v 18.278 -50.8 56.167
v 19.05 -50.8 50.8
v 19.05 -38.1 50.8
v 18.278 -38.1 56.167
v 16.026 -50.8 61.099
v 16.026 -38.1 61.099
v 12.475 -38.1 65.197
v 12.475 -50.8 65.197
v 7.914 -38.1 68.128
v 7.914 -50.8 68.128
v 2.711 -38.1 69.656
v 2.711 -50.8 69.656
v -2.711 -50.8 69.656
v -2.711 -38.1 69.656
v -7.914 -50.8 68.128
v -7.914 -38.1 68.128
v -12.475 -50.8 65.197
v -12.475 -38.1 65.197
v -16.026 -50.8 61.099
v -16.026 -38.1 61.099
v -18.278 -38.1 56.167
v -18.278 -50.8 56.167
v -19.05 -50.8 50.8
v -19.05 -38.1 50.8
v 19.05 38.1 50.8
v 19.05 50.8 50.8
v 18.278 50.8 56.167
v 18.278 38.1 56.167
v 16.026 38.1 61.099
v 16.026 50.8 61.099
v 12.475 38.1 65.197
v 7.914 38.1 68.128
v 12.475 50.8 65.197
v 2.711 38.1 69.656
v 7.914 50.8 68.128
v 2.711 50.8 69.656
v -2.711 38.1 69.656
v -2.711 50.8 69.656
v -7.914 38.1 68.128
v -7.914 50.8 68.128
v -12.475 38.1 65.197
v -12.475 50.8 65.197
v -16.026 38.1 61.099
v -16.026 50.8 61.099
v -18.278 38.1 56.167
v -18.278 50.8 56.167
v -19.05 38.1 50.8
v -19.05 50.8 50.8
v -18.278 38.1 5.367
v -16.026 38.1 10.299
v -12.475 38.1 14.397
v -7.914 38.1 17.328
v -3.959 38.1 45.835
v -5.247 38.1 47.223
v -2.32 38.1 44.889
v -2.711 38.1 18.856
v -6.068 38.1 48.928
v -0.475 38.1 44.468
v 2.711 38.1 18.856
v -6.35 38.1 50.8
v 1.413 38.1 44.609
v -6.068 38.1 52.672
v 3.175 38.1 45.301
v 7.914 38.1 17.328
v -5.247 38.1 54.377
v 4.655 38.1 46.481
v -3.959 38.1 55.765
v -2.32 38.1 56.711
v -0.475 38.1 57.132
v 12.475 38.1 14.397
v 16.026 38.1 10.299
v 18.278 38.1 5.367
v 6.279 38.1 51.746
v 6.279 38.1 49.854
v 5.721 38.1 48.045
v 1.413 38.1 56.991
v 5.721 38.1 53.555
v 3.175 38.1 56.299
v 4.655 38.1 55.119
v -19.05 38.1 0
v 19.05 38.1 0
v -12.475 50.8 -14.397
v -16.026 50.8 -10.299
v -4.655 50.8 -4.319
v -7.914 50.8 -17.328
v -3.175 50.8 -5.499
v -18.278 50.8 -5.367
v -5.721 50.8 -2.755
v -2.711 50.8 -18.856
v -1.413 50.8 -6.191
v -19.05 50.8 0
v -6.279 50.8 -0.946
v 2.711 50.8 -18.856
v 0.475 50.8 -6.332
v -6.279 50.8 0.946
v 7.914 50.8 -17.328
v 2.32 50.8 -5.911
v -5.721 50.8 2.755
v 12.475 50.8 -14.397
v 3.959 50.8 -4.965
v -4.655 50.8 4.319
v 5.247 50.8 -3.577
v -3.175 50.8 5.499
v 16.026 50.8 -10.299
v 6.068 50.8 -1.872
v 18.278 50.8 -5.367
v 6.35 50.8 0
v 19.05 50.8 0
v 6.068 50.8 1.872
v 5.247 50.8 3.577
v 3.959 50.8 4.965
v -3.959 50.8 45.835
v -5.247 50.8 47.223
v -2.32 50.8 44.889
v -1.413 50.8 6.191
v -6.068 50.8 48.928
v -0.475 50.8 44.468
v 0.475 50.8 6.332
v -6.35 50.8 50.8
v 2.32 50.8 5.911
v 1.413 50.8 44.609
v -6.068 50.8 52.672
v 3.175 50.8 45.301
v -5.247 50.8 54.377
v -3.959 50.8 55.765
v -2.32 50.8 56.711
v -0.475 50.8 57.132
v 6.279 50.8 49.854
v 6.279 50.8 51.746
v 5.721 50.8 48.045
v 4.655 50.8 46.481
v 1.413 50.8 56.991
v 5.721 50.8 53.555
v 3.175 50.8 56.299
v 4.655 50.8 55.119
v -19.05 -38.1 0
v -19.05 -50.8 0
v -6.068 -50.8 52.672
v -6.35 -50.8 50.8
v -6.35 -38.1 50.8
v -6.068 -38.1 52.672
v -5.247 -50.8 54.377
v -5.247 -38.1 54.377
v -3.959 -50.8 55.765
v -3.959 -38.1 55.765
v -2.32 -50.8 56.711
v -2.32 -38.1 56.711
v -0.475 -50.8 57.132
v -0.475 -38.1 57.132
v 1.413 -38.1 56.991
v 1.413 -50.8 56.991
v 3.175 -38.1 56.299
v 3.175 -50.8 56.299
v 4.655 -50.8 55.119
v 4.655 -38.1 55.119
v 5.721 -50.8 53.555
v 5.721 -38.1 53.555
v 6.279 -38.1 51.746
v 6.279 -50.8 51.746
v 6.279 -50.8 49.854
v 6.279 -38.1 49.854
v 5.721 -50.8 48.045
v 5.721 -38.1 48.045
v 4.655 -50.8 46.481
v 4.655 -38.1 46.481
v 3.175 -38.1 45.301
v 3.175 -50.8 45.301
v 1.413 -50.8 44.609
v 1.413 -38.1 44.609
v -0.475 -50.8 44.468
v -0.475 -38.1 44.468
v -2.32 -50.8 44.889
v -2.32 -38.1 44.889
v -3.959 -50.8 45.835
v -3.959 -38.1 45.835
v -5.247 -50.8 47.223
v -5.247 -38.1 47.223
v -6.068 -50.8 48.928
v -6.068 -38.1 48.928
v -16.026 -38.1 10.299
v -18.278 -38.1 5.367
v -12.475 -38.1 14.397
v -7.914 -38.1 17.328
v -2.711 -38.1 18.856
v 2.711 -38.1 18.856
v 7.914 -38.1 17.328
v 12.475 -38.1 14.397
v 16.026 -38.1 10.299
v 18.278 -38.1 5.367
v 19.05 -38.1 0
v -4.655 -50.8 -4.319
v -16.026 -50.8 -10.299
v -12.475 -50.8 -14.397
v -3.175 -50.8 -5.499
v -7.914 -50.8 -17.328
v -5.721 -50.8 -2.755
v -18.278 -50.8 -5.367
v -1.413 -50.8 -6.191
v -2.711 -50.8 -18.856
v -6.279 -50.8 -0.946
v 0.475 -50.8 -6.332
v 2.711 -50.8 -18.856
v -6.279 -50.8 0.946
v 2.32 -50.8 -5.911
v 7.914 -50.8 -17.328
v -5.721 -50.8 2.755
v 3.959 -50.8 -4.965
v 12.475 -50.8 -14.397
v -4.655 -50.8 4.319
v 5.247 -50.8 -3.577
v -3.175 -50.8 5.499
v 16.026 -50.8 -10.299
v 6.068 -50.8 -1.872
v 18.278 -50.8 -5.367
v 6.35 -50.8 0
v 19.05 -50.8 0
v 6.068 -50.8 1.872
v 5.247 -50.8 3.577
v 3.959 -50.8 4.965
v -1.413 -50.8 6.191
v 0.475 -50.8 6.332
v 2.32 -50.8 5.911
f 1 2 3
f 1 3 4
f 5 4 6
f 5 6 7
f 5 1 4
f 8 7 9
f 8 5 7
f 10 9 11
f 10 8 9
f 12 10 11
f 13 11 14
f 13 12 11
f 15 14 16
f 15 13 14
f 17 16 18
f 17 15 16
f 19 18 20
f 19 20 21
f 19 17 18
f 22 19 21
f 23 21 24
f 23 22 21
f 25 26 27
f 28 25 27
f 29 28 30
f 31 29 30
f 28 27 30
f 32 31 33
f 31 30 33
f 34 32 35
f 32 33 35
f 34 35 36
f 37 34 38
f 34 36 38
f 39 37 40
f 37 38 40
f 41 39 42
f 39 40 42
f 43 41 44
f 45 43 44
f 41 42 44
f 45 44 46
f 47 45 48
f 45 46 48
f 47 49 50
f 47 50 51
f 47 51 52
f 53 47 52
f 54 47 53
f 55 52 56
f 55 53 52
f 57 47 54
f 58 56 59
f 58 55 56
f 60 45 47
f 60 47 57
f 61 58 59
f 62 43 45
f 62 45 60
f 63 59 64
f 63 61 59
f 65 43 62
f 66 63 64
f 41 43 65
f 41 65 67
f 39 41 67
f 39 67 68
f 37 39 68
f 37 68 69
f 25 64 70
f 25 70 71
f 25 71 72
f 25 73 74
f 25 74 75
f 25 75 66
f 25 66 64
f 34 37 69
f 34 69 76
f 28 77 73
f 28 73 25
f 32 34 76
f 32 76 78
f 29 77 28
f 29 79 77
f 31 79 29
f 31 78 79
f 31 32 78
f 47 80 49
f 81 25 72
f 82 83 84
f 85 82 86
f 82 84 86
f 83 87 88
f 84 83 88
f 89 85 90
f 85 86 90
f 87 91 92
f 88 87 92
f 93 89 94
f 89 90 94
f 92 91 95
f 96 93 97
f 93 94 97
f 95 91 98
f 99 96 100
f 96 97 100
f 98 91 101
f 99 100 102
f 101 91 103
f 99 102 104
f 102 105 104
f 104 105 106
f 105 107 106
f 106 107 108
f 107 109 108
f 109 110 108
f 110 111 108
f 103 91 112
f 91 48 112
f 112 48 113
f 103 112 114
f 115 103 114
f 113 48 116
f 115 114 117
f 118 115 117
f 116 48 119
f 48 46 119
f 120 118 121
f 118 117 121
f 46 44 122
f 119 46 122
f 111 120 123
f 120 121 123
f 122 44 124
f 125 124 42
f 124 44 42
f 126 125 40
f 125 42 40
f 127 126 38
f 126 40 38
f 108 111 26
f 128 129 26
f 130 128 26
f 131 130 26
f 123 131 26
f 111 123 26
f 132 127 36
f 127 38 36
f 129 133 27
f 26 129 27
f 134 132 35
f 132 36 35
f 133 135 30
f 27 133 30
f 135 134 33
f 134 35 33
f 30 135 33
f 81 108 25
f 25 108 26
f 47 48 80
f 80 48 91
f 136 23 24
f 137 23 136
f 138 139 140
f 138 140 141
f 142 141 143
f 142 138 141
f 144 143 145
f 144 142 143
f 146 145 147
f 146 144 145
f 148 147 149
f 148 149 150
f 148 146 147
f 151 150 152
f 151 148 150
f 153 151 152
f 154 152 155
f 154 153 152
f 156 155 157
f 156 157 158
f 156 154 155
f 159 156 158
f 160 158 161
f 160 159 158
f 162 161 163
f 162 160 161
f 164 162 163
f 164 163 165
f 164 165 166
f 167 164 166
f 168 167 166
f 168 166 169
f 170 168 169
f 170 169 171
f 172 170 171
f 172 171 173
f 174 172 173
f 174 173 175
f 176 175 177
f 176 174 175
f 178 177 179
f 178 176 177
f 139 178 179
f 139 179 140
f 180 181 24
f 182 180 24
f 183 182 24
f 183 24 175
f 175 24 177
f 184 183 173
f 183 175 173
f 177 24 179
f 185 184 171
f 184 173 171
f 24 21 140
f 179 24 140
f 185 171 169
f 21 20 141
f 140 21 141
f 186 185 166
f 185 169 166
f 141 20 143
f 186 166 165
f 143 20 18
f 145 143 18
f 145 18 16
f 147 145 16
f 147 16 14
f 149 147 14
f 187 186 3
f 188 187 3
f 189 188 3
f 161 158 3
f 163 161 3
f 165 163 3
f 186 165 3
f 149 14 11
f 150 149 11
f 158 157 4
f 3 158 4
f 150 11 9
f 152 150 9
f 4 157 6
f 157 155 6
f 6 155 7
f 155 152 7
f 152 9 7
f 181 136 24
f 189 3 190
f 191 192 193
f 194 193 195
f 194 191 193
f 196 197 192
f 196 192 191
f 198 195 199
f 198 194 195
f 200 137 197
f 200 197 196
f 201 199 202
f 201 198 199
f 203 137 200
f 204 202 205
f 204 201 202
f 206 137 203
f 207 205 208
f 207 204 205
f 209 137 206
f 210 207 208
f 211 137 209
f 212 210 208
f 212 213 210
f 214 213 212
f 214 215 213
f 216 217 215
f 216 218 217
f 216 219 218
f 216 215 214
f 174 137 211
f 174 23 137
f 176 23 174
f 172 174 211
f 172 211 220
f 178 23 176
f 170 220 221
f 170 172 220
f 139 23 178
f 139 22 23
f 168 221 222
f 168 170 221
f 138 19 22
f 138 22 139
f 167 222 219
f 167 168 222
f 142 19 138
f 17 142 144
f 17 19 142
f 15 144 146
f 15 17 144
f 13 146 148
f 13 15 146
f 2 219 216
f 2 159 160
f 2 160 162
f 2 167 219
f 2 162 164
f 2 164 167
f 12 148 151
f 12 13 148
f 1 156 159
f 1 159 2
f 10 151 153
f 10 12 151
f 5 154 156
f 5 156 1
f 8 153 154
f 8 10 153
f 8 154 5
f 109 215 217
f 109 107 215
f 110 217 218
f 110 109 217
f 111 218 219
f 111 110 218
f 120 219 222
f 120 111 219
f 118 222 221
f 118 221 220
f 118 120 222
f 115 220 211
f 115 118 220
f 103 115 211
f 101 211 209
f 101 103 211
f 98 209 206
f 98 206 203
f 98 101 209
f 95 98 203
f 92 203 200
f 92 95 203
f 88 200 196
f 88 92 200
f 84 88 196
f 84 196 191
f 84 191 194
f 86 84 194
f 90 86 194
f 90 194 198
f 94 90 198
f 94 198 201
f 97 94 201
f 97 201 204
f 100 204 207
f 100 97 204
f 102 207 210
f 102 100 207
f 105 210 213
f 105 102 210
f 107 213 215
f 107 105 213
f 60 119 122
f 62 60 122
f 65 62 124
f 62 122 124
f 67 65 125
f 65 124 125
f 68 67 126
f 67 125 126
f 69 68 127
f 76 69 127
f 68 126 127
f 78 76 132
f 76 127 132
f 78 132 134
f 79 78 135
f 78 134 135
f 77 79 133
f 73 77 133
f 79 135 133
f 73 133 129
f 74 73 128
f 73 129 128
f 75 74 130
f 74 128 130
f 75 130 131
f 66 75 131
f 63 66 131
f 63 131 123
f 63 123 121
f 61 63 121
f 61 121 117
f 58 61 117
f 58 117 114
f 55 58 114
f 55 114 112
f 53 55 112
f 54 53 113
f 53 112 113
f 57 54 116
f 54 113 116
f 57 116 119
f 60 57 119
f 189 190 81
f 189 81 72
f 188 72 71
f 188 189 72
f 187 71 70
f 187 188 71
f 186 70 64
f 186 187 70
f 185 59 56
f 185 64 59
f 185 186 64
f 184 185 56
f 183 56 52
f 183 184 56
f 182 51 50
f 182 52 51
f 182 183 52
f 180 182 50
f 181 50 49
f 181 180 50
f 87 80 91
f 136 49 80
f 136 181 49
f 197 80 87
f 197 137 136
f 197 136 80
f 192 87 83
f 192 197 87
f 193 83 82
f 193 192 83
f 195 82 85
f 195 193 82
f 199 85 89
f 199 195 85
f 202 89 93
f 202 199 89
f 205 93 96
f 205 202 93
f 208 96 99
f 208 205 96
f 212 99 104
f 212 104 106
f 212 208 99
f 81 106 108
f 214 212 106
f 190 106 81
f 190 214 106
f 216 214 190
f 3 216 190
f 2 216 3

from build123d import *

# Parameters (mm, degrees)
F0_R     = 19.05
F0_R_2   = 6.35
F1_DEPTH = 50.8
F3_DEPTH = 12.7


with BuildPart() as f1:
    # F0 (on Front) → F1 (new body, symmetric)
    with BuildSketch(Plane.XZ):
        Circle(F0_R)
        Circle(F0_R_2, mode=Mode.SUBTRACT)
    extrude(amount=F1_DEPTH, both=True)

    # F2 (on face) → F3 (join)
    with BuildSketch(Plane.XZ.offset(50.8)):
        with BuildLine():
            Line((-19.05, 50.8), (-19.05, 0))
            ThreePointArc((-19.05, 0), (0, 19.05), (19.05, 0))
            Line((19.05, 0), (19.05, 50.8))
            ThreePointArc((19.05, 50.8), (0, 31.75), (-19.05, 50.8))
        make_face()
        with BuildLine():
            ThreePointArc((19.05, 50.8), (0, 69.85), (-19.05, 50.8))
            Line((-19.05, 50.8), (-6.35, 50.8))
            ThreePointArc((-6.35, 50.8), (0, 57.15), (6.35, 50.8))
            Line((6.35, 50.8), (19.05, 50.8))
        make_face()
        with BuildLine():
            Line((-6.35, 50.8), (-19.05, 50.8))
            ThreePointArc((-19.05, 50.8), (0, 31.75), (19.05, 50.8))
            Line((19.05, 50.8), (6.35, 50.8))
            ThreePointArc((6.35, 50.8), (0, 44.45), (-6.35, 50.8))
        make_face()
    extrude(amount=-F3_DEPTH)

    # F4: F1 across plane


with BuildPart() as f1_1:
    add(f1.part)
    add(f1.part.mirror(Plane.XZ))


solid = f1_1.part
